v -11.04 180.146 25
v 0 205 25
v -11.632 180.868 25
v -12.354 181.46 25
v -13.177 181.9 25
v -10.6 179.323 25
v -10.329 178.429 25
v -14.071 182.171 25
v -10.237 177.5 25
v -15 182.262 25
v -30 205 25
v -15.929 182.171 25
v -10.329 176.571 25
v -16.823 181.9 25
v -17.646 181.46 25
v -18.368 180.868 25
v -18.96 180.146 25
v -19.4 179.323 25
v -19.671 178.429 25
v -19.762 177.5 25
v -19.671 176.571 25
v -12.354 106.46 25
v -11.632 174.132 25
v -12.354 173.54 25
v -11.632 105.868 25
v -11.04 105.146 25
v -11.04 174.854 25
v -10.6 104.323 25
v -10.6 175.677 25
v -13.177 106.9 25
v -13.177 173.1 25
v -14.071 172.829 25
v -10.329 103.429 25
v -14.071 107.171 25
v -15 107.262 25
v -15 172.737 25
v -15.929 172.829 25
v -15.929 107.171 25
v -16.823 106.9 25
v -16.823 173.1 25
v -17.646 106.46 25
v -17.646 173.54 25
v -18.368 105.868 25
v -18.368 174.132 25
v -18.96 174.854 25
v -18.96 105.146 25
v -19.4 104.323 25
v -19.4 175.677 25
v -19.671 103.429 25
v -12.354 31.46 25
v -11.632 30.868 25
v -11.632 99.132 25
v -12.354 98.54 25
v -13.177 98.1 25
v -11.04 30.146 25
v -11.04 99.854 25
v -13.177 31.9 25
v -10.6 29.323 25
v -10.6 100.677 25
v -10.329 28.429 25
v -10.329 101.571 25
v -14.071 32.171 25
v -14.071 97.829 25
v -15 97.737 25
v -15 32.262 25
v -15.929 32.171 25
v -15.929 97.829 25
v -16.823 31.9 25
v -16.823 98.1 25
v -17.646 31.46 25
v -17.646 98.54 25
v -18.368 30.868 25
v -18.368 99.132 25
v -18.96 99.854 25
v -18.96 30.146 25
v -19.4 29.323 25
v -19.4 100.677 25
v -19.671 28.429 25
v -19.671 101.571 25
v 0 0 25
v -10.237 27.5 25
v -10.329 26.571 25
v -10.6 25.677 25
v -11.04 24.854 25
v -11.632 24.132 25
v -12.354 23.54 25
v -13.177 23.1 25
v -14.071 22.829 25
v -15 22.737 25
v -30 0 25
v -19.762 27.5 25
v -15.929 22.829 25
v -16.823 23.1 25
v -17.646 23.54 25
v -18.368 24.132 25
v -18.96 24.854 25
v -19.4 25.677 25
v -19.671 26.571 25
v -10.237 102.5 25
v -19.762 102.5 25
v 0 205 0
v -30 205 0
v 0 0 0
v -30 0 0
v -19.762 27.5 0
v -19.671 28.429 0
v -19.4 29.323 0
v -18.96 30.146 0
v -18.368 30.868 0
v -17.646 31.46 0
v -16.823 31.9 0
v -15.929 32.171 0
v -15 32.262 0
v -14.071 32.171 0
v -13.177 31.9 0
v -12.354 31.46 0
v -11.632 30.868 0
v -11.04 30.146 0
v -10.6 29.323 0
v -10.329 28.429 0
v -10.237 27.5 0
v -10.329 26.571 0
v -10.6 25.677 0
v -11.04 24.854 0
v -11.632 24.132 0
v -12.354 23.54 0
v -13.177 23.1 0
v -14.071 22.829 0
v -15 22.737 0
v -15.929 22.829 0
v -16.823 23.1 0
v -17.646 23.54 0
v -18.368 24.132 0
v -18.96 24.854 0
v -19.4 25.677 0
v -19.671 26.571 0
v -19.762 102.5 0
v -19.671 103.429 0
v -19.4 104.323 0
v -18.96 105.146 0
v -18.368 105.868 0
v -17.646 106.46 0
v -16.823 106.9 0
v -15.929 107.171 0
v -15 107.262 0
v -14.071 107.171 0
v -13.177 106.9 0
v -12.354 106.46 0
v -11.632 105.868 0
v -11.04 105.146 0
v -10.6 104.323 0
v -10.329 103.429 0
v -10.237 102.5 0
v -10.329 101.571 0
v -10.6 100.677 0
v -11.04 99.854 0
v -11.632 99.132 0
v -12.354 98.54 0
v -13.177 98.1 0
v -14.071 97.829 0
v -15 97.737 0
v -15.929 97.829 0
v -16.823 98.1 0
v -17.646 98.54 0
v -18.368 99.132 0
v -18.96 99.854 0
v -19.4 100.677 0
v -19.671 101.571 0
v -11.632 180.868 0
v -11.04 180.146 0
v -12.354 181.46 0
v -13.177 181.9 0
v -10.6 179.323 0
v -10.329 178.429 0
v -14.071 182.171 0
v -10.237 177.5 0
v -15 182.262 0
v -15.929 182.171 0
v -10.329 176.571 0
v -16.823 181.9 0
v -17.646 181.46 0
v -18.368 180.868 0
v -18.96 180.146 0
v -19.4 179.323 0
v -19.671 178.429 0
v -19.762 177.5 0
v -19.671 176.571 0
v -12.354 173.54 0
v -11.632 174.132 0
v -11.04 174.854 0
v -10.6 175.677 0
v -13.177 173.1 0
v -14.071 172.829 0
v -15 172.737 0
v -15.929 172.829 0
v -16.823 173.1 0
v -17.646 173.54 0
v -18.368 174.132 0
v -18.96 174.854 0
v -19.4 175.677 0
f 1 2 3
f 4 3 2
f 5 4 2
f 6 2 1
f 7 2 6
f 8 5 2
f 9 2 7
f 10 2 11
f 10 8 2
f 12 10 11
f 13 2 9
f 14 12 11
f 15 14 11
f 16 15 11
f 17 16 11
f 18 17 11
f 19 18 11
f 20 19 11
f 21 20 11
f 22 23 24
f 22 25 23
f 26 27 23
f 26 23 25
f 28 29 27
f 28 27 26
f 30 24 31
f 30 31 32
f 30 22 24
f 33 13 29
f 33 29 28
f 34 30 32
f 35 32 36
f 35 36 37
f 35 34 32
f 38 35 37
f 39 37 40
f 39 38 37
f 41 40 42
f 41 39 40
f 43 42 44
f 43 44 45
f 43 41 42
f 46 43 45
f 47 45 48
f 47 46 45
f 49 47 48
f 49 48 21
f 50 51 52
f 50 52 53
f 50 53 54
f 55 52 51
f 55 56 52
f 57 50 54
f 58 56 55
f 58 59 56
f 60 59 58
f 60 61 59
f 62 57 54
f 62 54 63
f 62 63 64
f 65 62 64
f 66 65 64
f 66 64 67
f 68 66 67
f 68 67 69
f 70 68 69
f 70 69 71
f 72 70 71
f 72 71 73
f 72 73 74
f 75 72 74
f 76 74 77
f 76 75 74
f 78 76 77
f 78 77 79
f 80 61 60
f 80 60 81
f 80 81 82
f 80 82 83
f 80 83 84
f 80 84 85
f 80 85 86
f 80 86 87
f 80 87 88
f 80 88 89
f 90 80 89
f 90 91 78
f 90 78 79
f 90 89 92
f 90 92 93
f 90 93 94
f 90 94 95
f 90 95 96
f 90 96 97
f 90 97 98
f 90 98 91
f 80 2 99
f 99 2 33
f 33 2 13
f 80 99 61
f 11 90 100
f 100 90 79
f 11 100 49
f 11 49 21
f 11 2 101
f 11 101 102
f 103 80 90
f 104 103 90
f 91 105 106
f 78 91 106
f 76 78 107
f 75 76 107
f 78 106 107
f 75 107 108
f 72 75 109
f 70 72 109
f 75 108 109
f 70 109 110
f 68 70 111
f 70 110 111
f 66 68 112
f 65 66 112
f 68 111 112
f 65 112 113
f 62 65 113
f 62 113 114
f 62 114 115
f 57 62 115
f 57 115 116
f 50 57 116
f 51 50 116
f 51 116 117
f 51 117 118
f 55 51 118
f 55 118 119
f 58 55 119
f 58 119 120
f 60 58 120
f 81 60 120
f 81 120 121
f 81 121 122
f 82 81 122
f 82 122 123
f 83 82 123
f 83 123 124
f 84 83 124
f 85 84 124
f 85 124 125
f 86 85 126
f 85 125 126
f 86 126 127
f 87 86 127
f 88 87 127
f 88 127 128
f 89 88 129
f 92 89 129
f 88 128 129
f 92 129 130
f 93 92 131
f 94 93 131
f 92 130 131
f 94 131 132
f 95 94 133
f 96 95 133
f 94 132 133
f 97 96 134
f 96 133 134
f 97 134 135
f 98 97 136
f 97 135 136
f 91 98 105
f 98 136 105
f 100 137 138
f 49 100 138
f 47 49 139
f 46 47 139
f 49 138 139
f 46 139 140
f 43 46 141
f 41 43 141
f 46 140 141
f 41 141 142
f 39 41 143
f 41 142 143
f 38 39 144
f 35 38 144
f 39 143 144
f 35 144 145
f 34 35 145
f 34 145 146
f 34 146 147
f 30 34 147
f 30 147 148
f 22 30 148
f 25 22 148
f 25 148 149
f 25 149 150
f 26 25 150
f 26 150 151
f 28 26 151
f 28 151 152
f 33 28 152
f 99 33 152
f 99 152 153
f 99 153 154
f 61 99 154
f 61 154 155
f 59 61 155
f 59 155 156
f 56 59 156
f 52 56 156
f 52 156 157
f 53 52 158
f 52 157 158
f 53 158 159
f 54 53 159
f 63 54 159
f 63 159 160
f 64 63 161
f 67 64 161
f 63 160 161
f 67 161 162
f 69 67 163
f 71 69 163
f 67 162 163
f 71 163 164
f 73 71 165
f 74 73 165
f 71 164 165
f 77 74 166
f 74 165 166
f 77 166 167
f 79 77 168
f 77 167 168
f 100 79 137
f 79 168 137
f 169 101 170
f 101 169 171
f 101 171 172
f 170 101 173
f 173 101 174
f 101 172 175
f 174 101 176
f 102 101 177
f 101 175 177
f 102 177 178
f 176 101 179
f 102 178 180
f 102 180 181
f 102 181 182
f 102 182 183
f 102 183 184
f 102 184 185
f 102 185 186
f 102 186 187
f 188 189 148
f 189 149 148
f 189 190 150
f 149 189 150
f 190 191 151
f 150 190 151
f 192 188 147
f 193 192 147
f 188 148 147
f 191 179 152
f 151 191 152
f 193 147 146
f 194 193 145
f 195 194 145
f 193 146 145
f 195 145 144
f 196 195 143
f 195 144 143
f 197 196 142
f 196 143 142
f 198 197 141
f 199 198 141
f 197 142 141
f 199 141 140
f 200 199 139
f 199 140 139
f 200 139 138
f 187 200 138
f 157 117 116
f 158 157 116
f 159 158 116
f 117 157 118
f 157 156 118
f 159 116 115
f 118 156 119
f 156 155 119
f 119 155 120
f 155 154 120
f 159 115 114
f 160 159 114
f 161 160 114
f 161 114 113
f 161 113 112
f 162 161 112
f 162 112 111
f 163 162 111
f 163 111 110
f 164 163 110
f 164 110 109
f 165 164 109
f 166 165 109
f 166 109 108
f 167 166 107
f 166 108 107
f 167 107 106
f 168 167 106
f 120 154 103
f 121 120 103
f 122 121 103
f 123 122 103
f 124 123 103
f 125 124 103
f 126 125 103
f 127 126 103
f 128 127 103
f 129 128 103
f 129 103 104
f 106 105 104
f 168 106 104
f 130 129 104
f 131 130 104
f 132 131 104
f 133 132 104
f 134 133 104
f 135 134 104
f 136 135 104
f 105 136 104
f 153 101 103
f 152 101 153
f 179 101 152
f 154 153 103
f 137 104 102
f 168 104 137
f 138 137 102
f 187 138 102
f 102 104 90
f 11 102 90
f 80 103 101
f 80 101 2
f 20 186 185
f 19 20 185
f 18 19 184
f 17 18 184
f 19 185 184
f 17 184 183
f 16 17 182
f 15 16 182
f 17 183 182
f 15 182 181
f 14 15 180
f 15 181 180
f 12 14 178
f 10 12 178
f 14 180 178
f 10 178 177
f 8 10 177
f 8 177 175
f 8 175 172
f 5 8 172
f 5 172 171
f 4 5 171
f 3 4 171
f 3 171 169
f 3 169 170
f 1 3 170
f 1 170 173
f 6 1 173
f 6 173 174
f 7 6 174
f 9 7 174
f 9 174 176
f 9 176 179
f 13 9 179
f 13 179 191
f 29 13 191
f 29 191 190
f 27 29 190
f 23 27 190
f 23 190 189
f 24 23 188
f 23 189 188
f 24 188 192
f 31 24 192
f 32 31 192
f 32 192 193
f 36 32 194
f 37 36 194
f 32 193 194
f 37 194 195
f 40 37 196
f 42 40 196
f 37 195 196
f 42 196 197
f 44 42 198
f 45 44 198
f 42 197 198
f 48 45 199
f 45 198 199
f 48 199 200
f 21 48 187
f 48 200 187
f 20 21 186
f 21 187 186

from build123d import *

# Parameters (mm, degrees)
SKETCH1_W           = 29.999999944
SKETCH1_H           = 25.000000038
BOSS_EXTRUDE1_DEPTH = 204.999999956
CUT_EXTRUDE1_REACH  = 210.686
SKETCH3_R           = 4.7625


with BuildPart() as part:
    # Sketch1 → Boss-Extrude1 (new body)
    with BuildSketch(Plane(origin=(0, 0, 0), x_dir=(-1, 0, 0), z_dir=(0, 1, 0))):
        with Locations((14.999999972, 12.500000019)):
            Rectangle(SKETCH1_W, SKETCH1_H)
    extrude(amount=BOSS_EXTRUDE1_DEPTH)

    # Sketch3 → Cut-Extrude1 (cut, up to next)
    with BuildSketch(Plane(origin=(0, 0, 0), x_dir=(1, 0, 0), z_dir=(0, 0, -1)), mode=Mode.PRIVATE) as cut_extrude1_sk1:
        with Locations(Location((-14.999999972, -102.499999978, 0), (0, 0, 180))):
            Circle(SKETCH3_R)
    cut_extrude1_tool1 = extrude(cut_extrude1_sk1.sketch, amount=-CUT_EXTRUDE1_REACH, mode=Mode.PRIVATE) & part.part
    # Sketch3 → Cut-Extrude1 (cut, up to next)
    with BuildSketch(Plane(origin=(0, 0, 0), x_dir=(1, 0, 0), z_dir=(0, 0, -1)), mode=Mode.PRIVATE) as cut_extrude1_sk2:
        with Locations(Location((-14.999999972, -27.499999991, 0), (0, 0, 180))):
            Circle(SKETCH3_R)
    cut_extrude1_tool2 = extrude(cut_extrude1_sk2.sketch, amount=-CUT_EXTRUDE1_REACH, mode=Mode.PRIVATE) & part.part
    # Sketch3 → Cut-Extrude1 (cut, up to next)
    with BuildSketch(Plane(origin=(0, 0, 0), x_dir=(1, 0, 0), z_dir=(0, 0, -1)), mode=Mode.PRIVATE) as cut_extrude1_sk3:
        with Locations(Location((-14.999999972, -177.499999965, 0), (0, 0, 180))):
            Circle(SKETCH3_R)
    cut_extrude1_tool3 = extrude(cut_extrude1_sk3.sketch, amount=-CUT_EXTRUDE1_REACH, mode=Mode.PRIVATE) & part.part
    add(cut_extrude1_tool1.solids().sort_by_distance((-15, 102.5, 0))[0], mode=Mode.SUBTRACT)
    add(cut_extrude1_tool2.solids().sort_by_distance((-15, 27.5, 0))[0], mode=Mode.SUBTRACT)
    add(cut_extrude1_tool3.solids().sort_by_distance((-15, 177.5, 0))[0], mode=Mode.SUBTRACT)


solid = part.part
